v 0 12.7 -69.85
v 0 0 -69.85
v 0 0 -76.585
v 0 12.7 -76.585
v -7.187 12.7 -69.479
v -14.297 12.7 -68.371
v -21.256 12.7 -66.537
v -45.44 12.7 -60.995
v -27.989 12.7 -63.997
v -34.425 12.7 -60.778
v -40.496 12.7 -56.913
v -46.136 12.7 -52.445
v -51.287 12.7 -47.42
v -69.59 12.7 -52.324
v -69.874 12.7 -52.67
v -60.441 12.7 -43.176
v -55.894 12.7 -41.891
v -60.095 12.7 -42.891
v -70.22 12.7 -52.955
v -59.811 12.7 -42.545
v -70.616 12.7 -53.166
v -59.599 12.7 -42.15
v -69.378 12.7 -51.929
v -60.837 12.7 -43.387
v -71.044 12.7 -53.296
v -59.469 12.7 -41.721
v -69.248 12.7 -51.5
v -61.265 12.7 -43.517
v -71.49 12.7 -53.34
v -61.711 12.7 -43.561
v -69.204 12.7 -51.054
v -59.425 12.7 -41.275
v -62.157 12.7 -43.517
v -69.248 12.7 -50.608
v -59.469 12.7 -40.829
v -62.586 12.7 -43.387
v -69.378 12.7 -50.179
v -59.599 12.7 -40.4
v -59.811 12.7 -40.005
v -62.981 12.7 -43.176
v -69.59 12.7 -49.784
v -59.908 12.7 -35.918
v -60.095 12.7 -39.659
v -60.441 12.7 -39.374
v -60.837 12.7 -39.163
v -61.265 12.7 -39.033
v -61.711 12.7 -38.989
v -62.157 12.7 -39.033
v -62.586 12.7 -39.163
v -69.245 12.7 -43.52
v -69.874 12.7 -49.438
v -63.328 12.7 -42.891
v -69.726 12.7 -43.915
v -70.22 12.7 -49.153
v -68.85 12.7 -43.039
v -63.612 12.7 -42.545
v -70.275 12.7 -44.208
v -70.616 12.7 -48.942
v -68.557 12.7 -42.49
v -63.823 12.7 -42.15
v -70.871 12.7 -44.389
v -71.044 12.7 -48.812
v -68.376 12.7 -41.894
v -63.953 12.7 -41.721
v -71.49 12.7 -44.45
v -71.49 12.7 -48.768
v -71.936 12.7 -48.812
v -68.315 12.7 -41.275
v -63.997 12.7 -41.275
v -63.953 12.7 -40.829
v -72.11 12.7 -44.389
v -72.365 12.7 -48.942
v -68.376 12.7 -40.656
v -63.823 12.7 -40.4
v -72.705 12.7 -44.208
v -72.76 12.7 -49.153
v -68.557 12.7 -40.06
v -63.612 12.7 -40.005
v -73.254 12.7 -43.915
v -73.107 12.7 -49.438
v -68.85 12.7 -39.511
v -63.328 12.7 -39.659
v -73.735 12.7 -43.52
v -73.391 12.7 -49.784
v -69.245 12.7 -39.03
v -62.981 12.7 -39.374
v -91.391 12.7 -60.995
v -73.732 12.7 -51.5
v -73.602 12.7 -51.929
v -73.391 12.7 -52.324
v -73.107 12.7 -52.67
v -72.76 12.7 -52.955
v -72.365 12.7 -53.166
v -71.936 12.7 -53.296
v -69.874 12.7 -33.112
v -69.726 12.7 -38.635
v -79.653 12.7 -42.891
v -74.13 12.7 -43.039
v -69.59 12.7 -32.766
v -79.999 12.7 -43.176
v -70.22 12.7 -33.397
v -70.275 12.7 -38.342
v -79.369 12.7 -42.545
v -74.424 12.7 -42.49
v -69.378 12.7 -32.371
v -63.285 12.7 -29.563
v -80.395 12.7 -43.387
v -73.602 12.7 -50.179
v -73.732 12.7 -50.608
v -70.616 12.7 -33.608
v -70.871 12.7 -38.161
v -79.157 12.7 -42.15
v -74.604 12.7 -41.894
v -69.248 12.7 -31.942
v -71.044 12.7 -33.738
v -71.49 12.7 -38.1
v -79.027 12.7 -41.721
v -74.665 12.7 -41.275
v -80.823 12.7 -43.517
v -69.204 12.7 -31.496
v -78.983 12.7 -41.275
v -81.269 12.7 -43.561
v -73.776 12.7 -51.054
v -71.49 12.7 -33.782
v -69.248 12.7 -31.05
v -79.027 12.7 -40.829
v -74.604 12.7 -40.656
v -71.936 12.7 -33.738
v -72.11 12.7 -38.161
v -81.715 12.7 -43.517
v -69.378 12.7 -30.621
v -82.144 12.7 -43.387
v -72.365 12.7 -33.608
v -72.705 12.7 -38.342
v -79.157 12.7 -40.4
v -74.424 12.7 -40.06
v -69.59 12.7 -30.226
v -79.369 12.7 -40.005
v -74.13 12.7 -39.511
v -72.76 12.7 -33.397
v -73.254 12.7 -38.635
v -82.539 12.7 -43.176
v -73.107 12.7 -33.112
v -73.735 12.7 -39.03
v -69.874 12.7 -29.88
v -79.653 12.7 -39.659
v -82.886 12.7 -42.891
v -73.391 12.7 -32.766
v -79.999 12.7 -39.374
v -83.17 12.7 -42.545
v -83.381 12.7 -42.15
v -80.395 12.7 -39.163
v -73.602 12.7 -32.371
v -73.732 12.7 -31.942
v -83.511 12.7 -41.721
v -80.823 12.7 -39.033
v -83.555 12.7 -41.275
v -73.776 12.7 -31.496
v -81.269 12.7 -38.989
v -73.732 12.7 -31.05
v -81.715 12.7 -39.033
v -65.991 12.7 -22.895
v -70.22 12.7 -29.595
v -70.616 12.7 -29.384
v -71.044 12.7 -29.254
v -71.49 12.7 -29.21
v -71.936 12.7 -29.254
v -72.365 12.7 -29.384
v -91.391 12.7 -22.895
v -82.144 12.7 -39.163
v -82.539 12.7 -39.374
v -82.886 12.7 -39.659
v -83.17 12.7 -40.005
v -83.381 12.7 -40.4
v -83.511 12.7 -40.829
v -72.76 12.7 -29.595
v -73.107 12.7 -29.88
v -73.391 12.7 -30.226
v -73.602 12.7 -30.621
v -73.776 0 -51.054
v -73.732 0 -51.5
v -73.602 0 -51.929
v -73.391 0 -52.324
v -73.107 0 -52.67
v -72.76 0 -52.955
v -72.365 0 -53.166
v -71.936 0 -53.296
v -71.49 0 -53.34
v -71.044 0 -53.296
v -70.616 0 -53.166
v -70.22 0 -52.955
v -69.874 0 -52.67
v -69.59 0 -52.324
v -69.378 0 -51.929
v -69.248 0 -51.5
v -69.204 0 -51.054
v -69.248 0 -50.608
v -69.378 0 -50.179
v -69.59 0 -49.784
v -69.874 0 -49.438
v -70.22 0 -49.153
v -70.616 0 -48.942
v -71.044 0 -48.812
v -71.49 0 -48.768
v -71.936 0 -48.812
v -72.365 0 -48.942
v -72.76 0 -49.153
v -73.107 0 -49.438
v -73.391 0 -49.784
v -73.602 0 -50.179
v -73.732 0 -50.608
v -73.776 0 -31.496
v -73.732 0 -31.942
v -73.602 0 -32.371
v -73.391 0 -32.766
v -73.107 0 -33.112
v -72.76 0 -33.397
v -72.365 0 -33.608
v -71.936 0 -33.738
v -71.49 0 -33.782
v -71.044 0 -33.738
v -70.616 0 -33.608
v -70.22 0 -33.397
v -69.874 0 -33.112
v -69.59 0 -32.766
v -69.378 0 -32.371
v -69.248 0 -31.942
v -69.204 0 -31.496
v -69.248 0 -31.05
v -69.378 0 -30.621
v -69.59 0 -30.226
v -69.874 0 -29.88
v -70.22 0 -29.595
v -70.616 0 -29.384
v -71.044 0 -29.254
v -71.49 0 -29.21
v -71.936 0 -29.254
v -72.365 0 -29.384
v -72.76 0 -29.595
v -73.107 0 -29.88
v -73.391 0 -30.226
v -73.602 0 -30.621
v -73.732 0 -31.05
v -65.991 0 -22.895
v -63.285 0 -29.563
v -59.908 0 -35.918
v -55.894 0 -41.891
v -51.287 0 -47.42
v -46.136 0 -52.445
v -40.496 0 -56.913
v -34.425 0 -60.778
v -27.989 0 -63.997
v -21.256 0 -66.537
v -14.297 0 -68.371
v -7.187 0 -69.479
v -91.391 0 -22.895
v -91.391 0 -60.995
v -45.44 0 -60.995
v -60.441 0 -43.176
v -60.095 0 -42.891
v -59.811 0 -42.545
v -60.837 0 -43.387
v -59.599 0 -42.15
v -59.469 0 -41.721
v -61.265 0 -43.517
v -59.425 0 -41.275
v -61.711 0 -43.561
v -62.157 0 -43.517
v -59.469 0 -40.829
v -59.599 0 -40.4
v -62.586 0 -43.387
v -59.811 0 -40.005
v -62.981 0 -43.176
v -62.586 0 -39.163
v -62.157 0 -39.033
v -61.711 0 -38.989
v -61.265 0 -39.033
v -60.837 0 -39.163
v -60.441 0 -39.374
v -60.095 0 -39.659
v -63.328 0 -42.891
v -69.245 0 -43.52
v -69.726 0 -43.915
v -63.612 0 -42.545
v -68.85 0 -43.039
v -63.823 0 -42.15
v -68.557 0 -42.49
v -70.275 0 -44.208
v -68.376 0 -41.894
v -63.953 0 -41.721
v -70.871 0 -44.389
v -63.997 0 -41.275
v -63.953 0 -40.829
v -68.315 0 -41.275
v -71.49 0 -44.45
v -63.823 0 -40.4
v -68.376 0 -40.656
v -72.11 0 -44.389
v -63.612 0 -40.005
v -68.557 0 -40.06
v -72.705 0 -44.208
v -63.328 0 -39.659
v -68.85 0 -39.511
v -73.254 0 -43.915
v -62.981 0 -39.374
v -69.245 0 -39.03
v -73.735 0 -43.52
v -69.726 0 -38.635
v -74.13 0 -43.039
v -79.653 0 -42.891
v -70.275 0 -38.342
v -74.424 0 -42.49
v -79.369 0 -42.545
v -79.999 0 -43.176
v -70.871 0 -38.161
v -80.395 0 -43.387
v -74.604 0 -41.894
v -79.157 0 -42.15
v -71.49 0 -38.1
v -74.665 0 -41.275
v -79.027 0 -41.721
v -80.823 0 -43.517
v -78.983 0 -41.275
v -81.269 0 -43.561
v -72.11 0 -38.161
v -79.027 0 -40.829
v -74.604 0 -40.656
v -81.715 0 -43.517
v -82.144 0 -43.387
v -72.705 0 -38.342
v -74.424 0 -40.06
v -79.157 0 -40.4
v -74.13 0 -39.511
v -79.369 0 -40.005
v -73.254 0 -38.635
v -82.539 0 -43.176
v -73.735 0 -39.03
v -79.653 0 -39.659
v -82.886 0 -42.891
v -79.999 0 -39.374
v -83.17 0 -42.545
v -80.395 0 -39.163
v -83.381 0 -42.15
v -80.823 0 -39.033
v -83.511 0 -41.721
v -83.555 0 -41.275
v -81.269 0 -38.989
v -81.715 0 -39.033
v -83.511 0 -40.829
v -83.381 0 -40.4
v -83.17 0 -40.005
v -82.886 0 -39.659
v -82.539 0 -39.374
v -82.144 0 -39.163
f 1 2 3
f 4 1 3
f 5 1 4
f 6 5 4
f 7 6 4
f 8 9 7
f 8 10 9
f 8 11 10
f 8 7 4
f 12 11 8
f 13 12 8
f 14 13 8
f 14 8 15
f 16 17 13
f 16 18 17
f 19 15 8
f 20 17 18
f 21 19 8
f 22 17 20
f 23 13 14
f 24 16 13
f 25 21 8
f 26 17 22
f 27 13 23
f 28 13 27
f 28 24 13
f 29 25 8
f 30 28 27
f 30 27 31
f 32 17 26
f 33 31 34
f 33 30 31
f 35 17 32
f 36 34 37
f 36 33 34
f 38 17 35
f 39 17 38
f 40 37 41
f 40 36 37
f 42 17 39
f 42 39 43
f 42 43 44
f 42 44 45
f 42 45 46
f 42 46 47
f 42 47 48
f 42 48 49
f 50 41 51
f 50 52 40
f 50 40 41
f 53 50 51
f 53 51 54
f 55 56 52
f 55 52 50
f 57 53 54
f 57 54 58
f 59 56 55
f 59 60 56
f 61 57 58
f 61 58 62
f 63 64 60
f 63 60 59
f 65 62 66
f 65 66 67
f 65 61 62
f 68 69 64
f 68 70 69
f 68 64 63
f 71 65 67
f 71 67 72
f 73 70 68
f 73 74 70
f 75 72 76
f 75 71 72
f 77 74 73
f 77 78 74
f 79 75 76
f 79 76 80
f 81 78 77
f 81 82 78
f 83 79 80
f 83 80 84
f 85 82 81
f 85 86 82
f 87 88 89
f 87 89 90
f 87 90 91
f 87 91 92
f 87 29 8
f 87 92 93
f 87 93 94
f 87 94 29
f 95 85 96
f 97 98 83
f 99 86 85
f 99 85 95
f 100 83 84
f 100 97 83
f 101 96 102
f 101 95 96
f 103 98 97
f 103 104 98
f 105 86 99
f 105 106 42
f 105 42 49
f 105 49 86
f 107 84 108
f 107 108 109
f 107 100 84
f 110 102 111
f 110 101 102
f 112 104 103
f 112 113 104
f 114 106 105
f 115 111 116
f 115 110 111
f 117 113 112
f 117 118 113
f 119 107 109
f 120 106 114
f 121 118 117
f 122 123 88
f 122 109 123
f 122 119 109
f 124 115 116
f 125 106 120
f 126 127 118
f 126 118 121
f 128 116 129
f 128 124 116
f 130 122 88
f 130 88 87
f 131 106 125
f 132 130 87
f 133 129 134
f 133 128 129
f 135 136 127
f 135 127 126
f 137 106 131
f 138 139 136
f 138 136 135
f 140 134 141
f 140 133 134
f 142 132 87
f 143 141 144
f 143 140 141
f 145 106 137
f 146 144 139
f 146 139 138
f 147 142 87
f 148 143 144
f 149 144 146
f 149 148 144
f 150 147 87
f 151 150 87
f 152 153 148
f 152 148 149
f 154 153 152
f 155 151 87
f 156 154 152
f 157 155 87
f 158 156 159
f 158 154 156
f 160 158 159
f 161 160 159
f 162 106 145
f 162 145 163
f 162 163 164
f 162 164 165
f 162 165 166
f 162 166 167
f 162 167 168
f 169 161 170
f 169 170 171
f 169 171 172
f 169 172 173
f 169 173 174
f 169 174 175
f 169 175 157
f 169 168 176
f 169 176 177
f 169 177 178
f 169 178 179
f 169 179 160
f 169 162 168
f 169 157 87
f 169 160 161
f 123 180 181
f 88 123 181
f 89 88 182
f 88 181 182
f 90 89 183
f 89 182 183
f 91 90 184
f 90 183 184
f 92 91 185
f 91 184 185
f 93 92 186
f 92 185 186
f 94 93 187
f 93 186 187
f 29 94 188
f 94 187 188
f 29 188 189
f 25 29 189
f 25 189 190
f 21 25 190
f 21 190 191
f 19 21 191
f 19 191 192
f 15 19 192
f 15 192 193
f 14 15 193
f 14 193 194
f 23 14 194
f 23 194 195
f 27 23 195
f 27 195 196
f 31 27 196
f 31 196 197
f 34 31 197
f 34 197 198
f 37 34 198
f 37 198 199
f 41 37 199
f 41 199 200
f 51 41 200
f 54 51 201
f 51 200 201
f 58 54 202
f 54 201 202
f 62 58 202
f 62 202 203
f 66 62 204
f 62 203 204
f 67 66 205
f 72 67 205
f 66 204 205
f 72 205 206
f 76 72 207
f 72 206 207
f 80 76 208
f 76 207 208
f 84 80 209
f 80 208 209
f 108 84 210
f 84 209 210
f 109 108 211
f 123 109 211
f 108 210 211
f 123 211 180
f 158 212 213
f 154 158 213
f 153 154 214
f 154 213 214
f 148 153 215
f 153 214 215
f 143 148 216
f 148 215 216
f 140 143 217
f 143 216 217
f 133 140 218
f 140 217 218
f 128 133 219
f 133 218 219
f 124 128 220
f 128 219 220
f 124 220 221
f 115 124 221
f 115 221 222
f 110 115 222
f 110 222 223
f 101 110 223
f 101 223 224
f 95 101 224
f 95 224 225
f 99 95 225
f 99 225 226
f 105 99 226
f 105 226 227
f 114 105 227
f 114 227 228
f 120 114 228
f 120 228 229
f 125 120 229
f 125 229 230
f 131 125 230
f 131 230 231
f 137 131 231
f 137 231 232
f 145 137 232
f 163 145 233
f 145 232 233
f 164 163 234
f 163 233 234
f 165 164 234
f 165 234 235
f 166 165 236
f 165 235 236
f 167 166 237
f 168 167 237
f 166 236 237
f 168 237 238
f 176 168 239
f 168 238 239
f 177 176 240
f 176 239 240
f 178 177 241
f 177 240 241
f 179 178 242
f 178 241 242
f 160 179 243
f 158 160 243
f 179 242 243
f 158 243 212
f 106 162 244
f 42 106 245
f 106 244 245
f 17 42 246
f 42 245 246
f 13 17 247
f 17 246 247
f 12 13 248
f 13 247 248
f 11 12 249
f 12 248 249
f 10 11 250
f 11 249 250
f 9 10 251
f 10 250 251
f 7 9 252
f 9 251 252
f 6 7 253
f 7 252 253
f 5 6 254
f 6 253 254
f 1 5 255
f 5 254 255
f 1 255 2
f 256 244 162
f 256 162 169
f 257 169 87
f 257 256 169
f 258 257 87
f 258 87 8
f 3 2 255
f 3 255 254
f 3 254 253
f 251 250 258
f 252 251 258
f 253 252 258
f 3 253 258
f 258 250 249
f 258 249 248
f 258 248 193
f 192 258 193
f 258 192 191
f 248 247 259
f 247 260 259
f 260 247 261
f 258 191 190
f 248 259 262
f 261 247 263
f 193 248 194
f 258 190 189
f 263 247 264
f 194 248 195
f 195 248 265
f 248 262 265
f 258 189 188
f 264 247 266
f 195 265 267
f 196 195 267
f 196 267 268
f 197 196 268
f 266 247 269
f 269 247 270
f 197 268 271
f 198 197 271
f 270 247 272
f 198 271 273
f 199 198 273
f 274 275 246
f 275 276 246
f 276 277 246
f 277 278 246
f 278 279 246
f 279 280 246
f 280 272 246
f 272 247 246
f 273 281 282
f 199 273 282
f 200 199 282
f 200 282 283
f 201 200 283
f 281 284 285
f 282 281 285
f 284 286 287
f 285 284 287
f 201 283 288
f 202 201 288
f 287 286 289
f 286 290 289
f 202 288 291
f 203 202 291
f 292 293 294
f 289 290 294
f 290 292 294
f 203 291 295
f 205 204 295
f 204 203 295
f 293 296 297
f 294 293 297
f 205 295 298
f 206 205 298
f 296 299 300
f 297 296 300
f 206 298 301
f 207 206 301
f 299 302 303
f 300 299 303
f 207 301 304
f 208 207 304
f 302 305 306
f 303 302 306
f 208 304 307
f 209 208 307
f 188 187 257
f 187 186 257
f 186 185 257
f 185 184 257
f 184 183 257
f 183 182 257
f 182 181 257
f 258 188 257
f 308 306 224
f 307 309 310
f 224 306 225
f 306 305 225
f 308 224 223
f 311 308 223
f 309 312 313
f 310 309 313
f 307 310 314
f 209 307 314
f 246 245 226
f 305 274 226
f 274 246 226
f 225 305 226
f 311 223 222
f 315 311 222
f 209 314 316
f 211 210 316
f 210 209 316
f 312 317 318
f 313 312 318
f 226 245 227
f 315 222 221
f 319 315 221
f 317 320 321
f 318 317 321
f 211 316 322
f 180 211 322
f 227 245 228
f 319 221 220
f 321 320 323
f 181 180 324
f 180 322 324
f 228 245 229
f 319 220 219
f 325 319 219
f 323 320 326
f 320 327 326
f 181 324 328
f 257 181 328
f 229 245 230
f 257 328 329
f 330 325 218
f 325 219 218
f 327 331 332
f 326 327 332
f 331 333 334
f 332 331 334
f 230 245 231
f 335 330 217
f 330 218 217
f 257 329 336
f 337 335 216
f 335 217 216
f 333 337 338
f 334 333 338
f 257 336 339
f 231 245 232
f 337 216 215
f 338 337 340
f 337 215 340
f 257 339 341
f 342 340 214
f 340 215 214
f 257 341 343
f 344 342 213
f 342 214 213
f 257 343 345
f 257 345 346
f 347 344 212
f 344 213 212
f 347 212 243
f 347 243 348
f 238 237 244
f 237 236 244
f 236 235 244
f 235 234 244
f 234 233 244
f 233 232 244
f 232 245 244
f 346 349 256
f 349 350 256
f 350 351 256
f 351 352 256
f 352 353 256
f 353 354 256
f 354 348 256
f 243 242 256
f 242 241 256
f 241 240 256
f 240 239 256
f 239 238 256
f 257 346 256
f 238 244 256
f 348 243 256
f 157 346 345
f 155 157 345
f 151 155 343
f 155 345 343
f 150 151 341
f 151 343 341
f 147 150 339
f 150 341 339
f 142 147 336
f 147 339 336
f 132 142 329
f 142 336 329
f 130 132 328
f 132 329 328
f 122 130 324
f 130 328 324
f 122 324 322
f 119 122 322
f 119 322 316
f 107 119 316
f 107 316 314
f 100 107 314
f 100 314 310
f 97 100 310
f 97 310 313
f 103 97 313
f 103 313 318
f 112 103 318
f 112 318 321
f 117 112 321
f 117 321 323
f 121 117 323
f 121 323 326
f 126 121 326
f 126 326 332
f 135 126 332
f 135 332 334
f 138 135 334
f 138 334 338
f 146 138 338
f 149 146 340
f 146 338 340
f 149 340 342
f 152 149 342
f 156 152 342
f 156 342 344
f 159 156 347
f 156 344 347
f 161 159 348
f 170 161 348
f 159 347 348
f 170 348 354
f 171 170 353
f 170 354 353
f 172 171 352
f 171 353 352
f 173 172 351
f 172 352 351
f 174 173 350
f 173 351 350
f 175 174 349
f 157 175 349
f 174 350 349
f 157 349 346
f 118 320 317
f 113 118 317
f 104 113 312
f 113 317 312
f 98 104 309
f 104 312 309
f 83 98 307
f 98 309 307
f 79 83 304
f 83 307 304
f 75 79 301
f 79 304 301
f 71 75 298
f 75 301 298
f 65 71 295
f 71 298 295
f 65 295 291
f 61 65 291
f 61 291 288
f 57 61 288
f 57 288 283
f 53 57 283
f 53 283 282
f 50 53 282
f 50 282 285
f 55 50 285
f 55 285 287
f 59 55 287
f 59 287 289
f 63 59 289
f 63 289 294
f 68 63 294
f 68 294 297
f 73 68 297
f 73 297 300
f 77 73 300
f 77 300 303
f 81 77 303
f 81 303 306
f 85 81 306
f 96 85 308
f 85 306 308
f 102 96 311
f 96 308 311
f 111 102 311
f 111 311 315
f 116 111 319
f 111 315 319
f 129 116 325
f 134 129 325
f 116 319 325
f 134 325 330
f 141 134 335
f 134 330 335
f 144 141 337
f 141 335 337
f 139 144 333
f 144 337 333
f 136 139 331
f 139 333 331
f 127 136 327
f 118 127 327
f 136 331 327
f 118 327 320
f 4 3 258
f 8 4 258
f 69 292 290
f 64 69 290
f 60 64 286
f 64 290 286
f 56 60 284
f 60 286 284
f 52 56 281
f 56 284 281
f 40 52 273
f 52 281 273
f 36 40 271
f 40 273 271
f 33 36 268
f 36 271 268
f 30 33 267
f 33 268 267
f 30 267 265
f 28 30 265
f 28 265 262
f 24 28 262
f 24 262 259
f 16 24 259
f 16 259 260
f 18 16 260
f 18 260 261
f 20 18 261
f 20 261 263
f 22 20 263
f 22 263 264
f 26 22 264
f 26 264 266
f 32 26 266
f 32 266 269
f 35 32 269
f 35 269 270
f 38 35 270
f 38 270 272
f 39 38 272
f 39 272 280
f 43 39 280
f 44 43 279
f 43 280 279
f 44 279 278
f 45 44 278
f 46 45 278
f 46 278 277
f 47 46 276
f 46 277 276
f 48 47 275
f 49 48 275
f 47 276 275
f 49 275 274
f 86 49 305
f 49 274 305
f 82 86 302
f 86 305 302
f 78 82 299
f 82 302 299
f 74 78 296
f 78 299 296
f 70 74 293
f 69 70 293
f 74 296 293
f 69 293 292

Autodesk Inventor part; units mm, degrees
ref_plane "YZ Plane" through (0, 0, 0) normal (1, 0, 0) x (0, 1, 0)
ref_plane "XZ Plane" through (0, 0, 0) normal (0, 1, 0) x (-1, 0, 0)
ref_plane "XY Plane" through (0, 0, 0) normal (0, 0, 1) x (1, 0, 0)
sketch "Sketch1" plane through (0, 0, 0) normal (0, 1, 0) x (-1, 0, 0)
  arc A0 (0, -69.85) -> (65.9911, -22.8953) centre (0, 0) ccw
  line L0 (0, 0) -> (60.4919, -34.925)
  line L1 (0, 0) -> (69.85, 0) construction
  line L2 (60.4919, -34.925) -> (82.4889, -47.625)
  line L3 (60.4919, -34.925) -> (71.4904, -41.275)
  line L4 (60.4919, -34.925) -> (60.4919, -47.625)
  line L5 (60.4919, -47.625) -> (82.4889, -47.625)
  line L6 (60.4919, -34.925) -> (82.4889, -34.925)
  line L7 (82.4889, -34.925) -> (82.4889, -47.625)
  line L8 (82.4889, -34.925) -> (60.4919, -47.625)
  circle A1 centre (71.4904, -41.275) radius 9.779
  circle A2 centre (71.4904, -41.275) radius 3.175
  circle A3 centre (71.4904, -51.054) radius 2.286
  circle A4 centre (71.4904, -31.496) radius 2.286
  circle A5 centre (81.2694, -41.275) radius 2.286
  circle A6 centre (61.7114, -41.275) radius 2.286
  line L9 (65.9911, -22.8953) -> (91.3911, -22.8953)
  line L10 (91.3911, -22.8953) -> (91.3911, -60.9953)
  line L11 (91.3911, -60.9953) -> (33.2947, -60.9953)
  line L12 (0, 0) -> (0, -69.85)
  line L13 (0, 0) -> (65.9911, -22.8953)
  line L14 (0, -69.85) -> (0, -76.585)
  line L15 (0, -76.585) -> (45.4402, -60.9953)
  dimension "d0" = 139.7
  dimension "d1" = 30
  dimension "d2" = 25.4
  dimension "d3" = 19.558
  dimension "d4" = 6.35
  dimension "d5" = 4.572
  dimension "d6" = 4.572
  dimension "d7" = 4.572
  dimension "d8" = 4.572
  dimension "d9" = 25.4
  dimension "d10" = 38.1
extrude "Extrusion1" add sketch "Sketch1" along normal blind 12.7 contours A0 L9 L10 L11 | L6 A1 L2 | L2 A1 A6 L4 | L11 L15 L14 A0 | A1 L6 L8 A2 L2 | L2 A2 L8 A1 A6 | A1 A4 L6 | A6 A1 L8 L4 | L6 L8 A1 | L8 A1 A5 L2 A2 | A2 L2 A1 L5 L8 | L8 A1 L5 | L7 A5 A1 L8 | L5 A1 A3 | A1 A5 L7 L2 | L2 L5 A1
properties part number "NewShooterFlicker"
